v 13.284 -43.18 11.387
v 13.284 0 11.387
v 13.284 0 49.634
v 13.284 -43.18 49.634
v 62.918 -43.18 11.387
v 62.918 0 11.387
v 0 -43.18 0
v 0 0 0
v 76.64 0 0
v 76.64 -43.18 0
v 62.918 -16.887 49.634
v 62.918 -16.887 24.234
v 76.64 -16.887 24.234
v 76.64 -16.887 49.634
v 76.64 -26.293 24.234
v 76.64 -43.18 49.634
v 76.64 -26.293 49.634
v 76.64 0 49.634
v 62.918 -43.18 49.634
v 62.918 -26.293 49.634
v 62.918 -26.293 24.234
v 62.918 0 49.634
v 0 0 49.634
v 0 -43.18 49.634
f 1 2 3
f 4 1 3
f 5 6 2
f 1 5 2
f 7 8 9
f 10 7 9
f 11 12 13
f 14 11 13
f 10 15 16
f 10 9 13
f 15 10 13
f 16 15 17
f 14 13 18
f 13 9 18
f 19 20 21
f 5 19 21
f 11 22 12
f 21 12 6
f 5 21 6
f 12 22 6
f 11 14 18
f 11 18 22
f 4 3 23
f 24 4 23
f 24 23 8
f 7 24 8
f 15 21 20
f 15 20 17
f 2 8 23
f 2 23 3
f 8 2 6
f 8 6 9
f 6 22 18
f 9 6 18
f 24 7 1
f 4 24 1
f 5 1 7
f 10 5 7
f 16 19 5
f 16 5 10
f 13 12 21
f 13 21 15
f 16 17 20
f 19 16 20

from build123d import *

# Parameters (mm, degrees)
F1_DEPTH = 43.18
F2_W     = 13.722286
F2_H     = 9.405698
F3_DEPTH = 25.4


with BuildPart() as f1:
    # F0 (on Front) → F1 (new body)
    with BuildSketch(Plane.XZ):
        Polygon((0, 49.633805), (0, 0), (76.640435, 0), (76.640435, 49.633805), (62.918149, 49.633805), (62.918149, 11.386576), (38.320217, 11.386576), (13.284341, 11.386576), (13.284341, 49.633805), align=None)
    extrude(amount=F1_DEPTH)

    # F2 (on face) → F3 (cut)
    with BuildSketch(Plane.XY.offset(49.633805)):
        with Locations((69.779292, -21.59)):
            Rectangle(F2_W, F2_H)
    extrude(amount=-F3_DEPTH, mode=Mode.SUBTRACT)


solid = f1.part
